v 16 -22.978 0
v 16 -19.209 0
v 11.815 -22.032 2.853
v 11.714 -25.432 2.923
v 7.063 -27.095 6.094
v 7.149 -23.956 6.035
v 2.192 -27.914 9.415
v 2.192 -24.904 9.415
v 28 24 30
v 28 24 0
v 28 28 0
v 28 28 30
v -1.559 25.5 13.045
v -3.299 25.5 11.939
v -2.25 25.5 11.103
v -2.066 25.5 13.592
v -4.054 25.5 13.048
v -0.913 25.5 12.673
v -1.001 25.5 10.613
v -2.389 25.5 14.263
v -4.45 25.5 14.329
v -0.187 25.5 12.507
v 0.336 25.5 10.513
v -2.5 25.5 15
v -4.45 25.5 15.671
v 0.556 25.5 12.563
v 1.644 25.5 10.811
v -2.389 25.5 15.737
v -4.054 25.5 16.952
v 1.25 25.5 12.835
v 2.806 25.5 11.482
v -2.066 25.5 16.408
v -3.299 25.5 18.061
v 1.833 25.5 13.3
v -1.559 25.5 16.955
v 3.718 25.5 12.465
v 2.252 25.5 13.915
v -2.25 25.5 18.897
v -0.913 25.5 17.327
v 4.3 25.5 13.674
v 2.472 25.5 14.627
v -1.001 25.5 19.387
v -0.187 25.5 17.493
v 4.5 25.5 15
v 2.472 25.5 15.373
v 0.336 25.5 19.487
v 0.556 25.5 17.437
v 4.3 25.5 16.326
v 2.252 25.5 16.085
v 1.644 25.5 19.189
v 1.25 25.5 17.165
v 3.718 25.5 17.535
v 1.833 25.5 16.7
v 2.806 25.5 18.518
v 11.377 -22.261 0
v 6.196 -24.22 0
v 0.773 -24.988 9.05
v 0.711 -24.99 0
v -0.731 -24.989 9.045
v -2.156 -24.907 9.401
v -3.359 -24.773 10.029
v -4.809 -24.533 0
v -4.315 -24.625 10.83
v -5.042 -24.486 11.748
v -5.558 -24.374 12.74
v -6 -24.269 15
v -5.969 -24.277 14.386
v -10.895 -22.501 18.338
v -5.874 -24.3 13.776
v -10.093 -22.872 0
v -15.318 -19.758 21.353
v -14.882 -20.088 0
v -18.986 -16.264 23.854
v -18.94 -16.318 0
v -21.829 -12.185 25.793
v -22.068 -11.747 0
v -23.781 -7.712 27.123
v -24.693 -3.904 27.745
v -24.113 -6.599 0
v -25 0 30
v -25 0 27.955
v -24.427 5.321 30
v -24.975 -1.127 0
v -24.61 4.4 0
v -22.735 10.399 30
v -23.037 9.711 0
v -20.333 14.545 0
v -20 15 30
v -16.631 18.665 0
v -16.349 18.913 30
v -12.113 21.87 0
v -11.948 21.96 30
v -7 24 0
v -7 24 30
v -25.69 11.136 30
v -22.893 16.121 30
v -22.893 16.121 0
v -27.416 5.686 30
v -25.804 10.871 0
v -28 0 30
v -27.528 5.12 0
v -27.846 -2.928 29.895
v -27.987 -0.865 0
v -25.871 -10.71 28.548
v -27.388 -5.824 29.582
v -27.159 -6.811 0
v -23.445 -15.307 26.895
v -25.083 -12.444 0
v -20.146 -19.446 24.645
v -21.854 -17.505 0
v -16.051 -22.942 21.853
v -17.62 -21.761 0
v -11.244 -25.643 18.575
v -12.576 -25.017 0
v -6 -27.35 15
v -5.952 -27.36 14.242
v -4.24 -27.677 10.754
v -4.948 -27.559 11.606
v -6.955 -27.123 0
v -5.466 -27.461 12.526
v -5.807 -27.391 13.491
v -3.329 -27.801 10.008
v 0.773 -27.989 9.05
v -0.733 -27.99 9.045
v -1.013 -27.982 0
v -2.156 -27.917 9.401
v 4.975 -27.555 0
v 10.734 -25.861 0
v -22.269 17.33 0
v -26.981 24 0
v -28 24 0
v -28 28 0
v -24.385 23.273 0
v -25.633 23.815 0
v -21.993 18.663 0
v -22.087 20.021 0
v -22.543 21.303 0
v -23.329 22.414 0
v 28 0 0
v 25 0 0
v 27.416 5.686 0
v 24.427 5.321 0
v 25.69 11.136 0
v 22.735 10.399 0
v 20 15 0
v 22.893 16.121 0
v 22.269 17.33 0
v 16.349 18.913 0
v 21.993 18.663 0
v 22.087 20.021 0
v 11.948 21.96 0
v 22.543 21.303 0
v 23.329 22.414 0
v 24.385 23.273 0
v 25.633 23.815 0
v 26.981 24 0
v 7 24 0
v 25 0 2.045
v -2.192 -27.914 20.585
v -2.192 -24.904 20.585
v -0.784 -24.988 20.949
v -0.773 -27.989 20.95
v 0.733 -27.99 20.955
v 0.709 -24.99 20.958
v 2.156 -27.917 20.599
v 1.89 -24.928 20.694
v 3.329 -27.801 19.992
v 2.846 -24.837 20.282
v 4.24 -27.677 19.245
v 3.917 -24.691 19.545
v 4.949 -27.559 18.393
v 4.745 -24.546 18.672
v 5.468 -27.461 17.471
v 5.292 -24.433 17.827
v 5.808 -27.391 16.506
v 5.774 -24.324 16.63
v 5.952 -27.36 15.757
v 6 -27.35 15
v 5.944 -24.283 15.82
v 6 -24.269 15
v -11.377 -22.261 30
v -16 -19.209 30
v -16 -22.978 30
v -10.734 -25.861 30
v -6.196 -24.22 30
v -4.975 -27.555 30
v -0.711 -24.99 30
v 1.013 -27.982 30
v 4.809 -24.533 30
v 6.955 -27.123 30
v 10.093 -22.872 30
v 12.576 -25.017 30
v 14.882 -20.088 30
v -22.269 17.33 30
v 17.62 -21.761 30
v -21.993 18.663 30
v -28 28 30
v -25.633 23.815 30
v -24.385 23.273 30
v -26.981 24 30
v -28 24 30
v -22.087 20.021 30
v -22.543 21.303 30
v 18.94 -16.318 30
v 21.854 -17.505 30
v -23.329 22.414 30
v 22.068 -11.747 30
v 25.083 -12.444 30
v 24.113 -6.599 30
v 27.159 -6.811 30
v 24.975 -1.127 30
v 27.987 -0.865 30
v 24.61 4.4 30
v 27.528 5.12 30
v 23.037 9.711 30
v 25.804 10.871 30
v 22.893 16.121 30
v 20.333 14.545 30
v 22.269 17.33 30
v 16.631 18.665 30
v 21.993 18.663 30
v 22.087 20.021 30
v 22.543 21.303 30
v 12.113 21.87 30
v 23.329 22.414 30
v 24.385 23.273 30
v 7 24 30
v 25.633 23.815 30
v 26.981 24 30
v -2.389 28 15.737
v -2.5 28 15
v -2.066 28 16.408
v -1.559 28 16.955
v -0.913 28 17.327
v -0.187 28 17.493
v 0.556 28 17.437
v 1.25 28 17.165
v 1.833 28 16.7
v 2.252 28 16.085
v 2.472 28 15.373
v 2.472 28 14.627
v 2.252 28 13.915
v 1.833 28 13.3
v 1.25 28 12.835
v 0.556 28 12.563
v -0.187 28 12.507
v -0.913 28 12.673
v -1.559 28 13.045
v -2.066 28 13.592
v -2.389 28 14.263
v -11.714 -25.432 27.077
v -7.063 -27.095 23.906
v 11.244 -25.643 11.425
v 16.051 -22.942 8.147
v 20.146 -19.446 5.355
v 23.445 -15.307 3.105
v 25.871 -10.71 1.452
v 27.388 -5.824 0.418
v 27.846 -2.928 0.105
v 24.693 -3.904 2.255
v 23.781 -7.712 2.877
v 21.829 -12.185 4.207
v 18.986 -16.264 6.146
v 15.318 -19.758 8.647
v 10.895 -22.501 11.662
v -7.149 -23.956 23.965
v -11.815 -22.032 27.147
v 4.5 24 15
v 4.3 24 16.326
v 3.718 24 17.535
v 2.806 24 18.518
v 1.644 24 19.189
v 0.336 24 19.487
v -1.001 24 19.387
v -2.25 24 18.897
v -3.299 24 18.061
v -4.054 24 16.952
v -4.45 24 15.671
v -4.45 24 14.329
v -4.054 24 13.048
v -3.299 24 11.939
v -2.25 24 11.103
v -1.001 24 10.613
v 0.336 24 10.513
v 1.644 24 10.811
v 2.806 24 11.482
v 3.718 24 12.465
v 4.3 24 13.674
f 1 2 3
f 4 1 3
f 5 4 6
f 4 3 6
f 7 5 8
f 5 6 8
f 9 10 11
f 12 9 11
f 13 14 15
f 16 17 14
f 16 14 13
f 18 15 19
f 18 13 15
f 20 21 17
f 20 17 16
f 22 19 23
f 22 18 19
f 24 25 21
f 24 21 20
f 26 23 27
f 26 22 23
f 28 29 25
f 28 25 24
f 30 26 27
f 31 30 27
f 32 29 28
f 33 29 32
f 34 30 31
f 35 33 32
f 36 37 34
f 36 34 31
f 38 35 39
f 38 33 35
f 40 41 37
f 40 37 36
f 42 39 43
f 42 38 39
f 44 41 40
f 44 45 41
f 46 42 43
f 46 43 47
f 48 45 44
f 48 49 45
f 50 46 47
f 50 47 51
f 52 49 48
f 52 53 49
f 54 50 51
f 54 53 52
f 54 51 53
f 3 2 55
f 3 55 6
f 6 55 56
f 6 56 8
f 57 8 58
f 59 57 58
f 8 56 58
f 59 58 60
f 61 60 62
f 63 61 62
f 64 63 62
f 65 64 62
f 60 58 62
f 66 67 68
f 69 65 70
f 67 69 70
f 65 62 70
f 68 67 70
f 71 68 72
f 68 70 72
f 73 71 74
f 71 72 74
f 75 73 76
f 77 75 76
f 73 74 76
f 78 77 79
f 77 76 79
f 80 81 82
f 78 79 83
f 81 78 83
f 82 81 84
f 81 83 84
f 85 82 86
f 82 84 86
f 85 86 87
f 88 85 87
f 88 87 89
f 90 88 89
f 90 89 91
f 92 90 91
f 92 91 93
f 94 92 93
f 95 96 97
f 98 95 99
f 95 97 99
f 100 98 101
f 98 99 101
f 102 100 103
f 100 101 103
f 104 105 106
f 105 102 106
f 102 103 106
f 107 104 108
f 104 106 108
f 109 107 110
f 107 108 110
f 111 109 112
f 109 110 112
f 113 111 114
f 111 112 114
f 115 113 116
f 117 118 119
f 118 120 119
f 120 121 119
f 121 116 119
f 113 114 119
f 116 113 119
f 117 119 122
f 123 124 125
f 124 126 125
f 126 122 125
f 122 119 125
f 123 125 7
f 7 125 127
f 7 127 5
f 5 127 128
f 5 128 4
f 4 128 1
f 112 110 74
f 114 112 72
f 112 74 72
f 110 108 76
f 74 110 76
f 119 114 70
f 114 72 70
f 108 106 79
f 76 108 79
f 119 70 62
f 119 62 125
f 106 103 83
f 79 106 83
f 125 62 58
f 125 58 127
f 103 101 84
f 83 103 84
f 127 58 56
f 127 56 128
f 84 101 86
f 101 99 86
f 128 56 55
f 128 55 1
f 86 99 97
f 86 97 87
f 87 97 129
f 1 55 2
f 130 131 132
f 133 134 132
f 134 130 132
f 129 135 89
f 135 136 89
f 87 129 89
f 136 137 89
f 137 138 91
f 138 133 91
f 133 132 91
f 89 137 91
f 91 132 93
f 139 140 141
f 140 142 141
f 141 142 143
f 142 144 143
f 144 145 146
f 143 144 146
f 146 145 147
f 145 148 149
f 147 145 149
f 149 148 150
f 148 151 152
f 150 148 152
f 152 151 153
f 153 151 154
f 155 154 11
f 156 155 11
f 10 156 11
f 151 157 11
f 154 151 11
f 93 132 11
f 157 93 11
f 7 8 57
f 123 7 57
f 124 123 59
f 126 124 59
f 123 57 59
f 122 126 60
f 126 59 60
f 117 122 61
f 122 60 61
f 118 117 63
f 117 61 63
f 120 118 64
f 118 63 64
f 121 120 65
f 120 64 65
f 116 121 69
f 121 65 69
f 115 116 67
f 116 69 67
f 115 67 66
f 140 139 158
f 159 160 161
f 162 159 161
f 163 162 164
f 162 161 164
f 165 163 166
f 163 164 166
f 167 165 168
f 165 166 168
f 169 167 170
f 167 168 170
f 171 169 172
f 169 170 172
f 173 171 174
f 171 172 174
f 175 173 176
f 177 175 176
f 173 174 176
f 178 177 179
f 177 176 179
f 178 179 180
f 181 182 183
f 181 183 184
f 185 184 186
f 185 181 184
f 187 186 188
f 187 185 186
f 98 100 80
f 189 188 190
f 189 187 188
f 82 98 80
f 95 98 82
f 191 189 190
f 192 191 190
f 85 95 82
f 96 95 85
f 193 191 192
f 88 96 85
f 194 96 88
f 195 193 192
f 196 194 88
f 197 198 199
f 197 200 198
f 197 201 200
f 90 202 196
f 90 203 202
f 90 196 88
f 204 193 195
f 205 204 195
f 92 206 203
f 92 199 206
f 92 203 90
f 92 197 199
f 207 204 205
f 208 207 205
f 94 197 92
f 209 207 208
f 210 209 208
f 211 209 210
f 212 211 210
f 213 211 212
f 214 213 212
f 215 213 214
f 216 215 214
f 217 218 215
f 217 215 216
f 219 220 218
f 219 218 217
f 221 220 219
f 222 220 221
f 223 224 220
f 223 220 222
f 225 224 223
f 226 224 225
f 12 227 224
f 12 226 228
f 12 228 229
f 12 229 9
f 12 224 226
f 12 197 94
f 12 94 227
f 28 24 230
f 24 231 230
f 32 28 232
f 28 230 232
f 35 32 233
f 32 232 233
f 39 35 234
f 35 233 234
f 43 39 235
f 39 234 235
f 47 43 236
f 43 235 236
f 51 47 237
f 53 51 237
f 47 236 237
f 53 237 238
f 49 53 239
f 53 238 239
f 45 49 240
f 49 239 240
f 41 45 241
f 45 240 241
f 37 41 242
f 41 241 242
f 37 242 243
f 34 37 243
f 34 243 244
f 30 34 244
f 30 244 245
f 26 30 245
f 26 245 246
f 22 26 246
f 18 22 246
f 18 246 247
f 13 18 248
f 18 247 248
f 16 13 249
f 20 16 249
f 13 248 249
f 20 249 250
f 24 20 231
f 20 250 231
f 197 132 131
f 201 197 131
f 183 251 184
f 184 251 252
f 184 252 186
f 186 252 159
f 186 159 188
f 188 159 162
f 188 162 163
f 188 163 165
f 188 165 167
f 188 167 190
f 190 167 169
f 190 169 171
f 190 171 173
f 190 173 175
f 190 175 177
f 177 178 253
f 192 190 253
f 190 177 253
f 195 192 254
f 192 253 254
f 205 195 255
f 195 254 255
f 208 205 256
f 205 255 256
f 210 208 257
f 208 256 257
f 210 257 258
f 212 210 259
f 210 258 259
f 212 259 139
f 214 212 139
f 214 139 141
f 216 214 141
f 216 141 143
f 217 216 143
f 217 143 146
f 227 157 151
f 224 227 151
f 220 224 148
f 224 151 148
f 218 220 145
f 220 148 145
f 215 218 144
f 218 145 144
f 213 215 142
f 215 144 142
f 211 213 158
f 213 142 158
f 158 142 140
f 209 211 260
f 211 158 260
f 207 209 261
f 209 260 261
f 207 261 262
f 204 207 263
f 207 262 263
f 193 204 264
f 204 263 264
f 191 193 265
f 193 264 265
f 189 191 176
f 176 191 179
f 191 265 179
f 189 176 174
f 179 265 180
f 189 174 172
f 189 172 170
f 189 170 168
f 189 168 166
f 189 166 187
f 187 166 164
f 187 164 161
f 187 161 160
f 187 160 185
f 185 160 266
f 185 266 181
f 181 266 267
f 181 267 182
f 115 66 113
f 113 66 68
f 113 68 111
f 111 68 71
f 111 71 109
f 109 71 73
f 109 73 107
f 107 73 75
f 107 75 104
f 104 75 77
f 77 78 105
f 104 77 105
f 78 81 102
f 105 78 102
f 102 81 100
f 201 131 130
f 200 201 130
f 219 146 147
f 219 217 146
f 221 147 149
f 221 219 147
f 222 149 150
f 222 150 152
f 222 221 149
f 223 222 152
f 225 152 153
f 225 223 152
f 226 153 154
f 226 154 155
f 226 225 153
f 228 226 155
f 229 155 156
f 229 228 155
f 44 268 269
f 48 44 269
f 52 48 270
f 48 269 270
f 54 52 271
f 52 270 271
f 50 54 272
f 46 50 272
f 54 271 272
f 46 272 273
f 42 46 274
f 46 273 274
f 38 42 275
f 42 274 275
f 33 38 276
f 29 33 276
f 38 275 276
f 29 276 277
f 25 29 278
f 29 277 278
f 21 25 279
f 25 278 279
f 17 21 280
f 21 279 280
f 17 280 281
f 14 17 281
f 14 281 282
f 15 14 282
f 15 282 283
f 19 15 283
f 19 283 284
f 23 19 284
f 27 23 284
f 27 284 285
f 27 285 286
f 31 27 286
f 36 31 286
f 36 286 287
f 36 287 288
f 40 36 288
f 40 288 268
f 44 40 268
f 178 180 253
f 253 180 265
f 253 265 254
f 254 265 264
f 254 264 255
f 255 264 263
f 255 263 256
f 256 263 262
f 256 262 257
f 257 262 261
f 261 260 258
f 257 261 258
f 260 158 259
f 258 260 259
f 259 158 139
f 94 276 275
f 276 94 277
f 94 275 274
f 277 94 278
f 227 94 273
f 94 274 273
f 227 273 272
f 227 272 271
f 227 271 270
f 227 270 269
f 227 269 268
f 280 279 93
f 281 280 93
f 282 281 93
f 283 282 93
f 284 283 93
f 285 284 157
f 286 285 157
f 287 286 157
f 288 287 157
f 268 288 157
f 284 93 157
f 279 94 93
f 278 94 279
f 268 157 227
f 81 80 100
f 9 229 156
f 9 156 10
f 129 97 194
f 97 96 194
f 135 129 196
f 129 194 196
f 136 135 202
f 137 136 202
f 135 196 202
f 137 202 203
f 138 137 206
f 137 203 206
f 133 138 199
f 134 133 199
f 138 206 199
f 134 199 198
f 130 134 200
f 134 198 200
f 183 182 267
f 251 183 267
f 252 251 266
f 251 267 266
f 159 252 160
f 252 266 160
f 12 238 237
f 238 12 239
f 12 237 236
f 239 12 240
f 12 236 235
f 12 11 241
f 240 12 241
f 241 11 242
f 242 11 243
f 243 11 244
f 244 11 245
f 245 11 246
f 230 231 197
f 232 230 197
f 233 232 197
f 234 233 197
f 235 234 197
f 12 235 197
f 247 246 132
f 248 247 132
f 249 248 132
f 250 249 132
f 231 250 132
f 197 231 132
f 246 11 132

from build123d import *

# Parameters (mm, degrees)
F1_DEPTH       = 30
F2_R           = 5
F4_START       = -28
F4_DEPTH       = 28.001
F6_D           = 5
F6_CBORE_D     = 9
F6_CBORE_DEPTH = 1.5
F7_D           = 12
F7_DEPTH       = 52.001


with BuildPart() as f1:
    # F0 (on Top) → F1 (new body)
    with BuildSketch(Plane.XY):
        with BuildLine():
            ThreePointArc((7, 24), (0, -25), (-7, 24))
            Line((-7, 24), (-14.4222051019, 24))
            ThreePointArc((-14.4222051019, 24), (0, -28), (14.4222051019, 24))
            Line((14.4222051019, 24), (7, 24))
        make_face()
        Polygon((-14.4222051019, 24), (-7, 24), (7, 24), (14.4222051019, 24), (28, 24), (28, 28), (-28, 28), (-28, 24), align=None)
    extrude(amount=F1_DEPTH)

    # F2
    f2_edges = [f1.edges().sort_by_distance(p)[0] for p in [
        (-14.422205, 24, 15),
        (14.422205, 24, 15),
    ]]
    fillet(f2_edges, radius=F2_R)

    # F3 (on face) → F4 (cut)
    with BuildSketch(Plane(origin=(0, 28, 0), x_dir=(-1, 0, 0), z_dir=(0, 1, 0)).offset(F4_START)):
        Polygon((28, 30), (16, 30), (-28, 0), (-16, 0), align=None)
    extrude(amount=-F4_DEPTH, mode=Mode.SUBTRACT)

    # F6 (through all)
    with Locations(Plane.XZ.offset(-24)):
        with Locations((0, 15)):
            CounterBoreHole(F6_D / 2, F6_CBORE_D / 2, F6_CBORE_DEPTH)

    # F7 (through all, one way)
    with BuildSketch(Plane(origin=(0, 24, 0), x_dir=(1, 0, 0), z_dir=(0, 1, 0))):
        with Locations((0, -15)):
            Circle(F7_D / 2)
    extrude(amount=-F7_DEPTH, mode=Mode.SUBTRACT)


solid = f1.part
